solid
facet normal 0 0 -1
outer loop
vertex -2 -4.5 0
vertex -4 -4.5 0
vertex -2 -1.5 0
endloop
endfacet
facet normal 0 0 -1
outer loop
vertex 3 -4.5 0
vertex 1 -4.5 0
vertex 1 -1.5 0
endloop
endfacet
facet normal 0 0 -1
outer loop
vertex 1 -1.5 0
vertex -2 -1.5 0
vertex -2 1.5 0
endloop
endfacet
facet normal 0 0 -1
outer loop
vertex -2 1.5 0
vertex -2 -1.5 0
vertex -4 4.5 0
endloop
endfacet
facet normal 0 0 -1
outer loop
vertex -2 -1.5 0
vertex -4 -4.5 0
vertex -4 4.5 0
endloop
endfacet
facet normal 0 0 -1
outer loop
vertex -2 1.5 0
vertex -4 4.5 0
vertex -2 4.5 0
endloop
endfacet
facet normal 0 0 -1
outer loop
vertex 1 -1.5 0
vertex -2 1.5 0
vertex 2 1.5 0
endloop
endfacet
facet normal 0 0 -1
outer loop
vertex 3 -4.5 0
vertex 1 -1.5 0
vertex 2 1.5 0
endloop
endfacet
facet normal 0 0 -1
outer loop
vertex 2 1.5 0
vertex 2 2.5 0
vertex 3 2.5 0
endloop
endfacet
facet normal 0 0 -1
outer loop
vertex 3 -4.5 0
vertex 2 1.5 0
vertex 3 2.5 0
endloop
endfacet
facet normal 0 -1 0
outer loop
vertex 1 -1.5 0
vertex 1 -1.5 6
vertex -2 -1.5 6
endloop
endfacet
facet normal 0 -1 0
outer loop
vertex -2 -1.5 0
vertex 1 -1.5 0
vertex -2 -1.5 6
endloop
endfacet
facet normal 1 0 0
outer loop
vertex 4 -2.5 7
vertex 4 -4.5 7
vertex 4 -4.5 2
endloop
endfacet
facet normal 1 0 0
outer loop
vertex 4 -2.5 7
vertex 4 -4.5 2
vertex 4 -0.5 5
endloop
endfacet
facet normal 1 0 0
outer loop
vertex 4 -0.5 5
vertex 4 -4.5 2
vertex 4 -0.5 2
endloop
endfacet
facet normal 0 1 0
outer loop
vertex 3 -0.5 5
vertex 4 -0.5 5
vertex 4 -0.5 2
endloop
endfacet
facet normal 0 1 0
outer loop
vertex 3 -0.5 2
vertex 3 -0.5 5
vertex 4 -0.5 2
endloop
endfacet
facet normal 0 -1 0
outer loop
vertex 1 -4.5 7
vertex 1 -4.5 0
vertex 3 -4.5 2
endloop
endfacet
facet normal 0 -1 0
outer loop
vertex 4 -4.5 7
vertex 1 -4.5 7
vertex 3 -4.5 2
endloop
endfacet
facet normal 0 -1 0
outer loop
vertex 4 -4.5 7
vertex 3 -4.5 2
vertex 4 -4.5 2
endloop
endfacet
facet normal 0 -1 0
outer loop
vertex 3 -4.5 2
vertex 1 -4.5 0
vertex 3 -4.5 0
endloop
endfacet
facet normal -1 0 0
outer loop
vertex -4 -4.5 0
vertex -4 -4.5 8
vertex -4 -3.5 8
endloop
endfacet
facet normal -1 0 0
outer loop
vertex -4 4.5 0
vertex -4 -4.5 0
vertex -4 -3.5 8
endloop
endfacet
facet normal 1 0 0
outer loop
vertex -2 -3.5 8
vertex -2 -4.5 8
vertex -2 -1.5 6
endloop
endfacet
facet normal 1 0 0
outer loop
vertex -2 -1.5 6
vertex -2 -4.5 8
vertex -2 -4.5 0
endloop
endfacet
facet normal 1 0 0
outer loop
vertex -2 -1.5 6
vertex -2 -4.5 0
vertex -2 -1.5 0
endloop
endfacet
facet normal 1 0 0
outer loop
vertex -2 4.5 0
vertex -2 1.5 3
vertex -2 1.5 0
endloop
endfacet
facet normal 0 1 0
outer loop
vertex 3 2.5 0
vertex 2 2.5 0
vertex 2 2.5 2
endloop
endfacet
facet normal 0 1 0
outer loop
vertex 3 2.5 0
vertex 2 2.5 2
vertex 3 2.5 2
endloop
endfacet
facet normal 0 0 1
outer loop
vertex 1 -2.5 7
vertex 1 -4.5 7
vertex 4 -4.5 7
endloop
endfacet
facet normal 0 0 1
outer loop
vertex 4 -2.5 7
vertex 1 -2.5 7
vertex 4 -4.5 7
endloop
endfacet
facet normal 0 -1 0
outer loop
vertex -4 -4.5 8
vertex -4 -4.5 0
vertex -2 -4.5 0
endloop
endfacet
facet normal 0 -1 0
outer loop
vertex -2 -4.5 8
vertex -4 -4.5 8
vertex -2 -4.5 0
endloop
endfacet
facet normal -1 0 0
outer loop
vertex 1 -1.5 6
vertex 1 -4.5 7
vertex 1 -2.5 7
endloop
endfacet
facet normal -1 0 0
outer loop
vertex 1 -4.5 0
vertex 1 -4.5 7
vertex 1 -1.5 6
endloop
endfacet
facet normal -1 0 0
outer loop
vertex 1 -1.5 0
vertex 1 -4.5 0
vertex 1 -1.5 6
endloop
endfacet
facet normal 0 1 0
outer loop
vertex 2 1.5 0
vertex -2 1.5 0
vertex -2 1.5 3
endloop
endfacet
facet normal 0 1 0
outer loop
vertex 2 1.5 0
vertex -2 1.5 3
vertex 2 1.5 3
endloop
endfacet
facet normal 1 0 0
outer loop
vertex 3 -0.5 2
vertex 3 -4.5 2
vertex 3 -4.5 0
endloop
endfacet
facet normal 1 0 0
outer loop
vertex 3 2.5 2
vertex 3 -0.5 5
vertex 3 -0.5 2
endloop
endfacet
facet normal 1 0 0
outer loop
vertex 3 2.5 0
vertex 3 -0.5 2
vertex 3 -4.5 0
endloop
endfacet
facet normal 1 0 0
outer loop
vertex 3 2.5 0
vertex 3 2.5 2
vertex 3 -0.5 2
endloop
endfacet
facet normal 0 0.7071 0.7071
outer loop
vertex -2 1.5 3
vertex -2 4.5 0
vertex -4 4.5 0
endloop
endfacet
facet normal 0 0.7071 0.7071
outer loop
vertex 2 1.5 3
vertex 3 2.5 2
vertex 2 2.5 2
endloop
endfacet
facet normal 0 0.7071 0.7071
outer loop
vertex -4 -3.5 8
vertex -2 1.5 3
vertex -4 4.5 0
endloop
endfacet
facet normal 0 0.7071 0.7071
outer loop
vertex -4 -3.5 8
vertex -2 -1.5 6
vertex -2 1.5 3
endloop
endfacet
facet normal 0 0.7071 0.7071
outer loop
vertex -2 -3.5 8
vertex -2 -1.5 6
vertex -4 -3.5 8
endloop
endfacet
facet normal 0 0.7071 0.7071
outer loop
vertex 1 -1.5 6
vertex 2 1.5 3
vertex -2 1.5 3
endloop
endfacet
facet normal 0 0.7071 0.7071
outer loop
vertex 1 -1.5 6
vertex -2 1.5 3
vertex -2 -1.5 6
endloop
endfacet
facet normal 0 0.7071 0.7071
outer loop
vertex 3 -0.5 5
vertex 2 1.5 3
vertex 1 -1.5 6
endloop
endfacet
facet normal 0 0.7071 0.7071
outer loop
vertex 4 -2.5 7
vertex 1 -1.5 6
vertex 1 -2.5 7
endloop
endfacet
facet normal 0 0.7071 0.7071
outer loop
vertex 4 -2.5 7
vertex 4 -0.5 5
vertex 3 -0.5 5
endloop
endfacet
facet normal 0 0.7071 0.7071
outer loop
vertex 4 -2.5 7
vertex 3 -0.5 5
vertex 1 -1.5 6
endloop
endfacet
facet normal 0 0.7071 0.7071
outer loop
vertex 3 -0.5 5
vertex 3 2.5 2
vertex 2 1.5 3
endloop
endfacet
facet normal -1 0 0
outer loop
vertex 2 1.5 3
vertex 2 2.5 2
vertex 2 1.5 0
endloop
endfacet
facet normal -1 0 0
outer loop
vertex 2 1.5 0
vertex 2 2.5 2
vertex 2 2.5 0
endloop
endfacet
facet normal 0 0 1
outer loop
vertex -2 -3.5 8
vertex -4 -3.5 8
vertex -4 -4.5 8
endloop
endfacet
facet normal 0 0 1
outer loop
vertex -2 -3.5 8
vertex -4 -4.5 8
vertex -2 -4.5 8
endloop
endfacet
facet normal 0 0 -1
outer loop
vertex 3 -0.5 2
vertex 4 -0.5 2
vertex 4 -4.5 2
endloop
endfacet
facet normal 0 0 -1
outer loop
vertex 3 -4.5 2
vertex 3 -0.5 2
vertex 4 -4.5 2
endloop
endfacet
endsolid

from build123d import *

# Parameters (mm, degrees)
SKETCH1_W           = 8
SKETCH1_H           = 9
BOSS_EXTRUDE1_DEPTH = 8
SKETCH2_W           = 4
SKETCH2_H           = 3
CUT_EXTRUDE1_DEPTH  = 3
SKETCH3_W           = 2
SKETCH3_H           = 2
CUT_EXTRUDE2_DEPTH  = 2
CUT_EXTRUDE3_DEPTH  = 1
CUT_EXTRUDE4_DEPTH  = 9
SKETCH6_W           = 3
SKETCH6_H           = 3
CUT_EXTRUDE5_DEPTH  = 9
SKETCH7_W           = 3
SKETCH7_H           = 1
CUT_EXTRUDE6_DEPTH  = 2


with BuildPart() as part:
    # Sketch1 → Boss-Extrude1 (new body)
    with BuildSketch(Plane.XY):
        Rectangle(SKETCH1_W, SKETCH1_H)
    extrude(amount=BOSS_EXTRUDE1_DEPTH)

    # Sketch2 → Cut-Extrude1 (cut)
    with BuildSketch(Plane(origin=(0, 4.5, 0), x_dir=(1, 0, 0), z_dir=(0, 1, 0))):
        with Locations((0, -1.5)):
            Rectangle(SKETCH2_W, SKETCH2_H)
    extrude(amount=-CUT_EXTRUDE1_DEPTH, mode=Mode.SUBTRACT)

    # Sketch3 → Cut-Extrude2 (cut)
    with BuildSketch(Plane(origin=(0, 4.5, 0), x_dir=(1, 0, 0), z_dir=(0, 1, 0))):
        with Locations((3, -1)):
            Rectangle(SKETCH3_W, SKETCH3_H)
    extrude(amount=-CUT_EXTRUDE2_DEPTH, mode=Mode.SUBTRACT)

    # Sketch4 → Cut-Extrude3 (cut)
    with BuildSketch(Plane(origin=(4, 0, 0), x_dir=(0, 0, -1), z_dir=(1, 0, 0))):
        Polygon((0, -4.5), (0, 2.5), (-2, 2.5), (-5, -0.5), (-2, -0.5), (-2, -4.5), align=None)
    extrude(amount=-CUT_EXTRUDE3_DEPTH, mode=Mode.SUBTRACT)

    # Sketch5 → Cut-Extrude4 (cut, through all)
    with BuildSketch(Plane(origin=(4, 0, 0), x_dir=(0, 0, -1), z_dir=(1, 0, 0))):
        Polygon((0, 4.5), (-8, -3.5), (-8, 4.5), align=None)
    extrude(amount=-CUT_EXTRUDE4_DEPTH, mode=Mode.SUBTRACT)

    # Sketch6 → Cut-Extrude5 (cut, through all)
    with BuildSketch(Plane(origin=(0, 0, 0), x_dir=(-1, 0, 0), z_dir=(0, 0, -1))):
        with Locations((0.5, -3)):
            Rectangle(SKETCH6_W, SKETCH6_H)
    extrude(amount=-CUT_EXTRUDE5_DEPTH, mode=Mode.SUBTRACT)

    # Sketch7 → Cut-Extrude6 (cut)
    with BuildSketch(Plane.XZ.offset(4.5)):
        with Locations((2.5, 7.5)):
            Rectangle(SKETCH7_W, SKETCH7_H)
    extrude(amount=-CUT_EXTRUDE6_DEPTH, mode=Mode.SUBTRACT)


solid = part.part
